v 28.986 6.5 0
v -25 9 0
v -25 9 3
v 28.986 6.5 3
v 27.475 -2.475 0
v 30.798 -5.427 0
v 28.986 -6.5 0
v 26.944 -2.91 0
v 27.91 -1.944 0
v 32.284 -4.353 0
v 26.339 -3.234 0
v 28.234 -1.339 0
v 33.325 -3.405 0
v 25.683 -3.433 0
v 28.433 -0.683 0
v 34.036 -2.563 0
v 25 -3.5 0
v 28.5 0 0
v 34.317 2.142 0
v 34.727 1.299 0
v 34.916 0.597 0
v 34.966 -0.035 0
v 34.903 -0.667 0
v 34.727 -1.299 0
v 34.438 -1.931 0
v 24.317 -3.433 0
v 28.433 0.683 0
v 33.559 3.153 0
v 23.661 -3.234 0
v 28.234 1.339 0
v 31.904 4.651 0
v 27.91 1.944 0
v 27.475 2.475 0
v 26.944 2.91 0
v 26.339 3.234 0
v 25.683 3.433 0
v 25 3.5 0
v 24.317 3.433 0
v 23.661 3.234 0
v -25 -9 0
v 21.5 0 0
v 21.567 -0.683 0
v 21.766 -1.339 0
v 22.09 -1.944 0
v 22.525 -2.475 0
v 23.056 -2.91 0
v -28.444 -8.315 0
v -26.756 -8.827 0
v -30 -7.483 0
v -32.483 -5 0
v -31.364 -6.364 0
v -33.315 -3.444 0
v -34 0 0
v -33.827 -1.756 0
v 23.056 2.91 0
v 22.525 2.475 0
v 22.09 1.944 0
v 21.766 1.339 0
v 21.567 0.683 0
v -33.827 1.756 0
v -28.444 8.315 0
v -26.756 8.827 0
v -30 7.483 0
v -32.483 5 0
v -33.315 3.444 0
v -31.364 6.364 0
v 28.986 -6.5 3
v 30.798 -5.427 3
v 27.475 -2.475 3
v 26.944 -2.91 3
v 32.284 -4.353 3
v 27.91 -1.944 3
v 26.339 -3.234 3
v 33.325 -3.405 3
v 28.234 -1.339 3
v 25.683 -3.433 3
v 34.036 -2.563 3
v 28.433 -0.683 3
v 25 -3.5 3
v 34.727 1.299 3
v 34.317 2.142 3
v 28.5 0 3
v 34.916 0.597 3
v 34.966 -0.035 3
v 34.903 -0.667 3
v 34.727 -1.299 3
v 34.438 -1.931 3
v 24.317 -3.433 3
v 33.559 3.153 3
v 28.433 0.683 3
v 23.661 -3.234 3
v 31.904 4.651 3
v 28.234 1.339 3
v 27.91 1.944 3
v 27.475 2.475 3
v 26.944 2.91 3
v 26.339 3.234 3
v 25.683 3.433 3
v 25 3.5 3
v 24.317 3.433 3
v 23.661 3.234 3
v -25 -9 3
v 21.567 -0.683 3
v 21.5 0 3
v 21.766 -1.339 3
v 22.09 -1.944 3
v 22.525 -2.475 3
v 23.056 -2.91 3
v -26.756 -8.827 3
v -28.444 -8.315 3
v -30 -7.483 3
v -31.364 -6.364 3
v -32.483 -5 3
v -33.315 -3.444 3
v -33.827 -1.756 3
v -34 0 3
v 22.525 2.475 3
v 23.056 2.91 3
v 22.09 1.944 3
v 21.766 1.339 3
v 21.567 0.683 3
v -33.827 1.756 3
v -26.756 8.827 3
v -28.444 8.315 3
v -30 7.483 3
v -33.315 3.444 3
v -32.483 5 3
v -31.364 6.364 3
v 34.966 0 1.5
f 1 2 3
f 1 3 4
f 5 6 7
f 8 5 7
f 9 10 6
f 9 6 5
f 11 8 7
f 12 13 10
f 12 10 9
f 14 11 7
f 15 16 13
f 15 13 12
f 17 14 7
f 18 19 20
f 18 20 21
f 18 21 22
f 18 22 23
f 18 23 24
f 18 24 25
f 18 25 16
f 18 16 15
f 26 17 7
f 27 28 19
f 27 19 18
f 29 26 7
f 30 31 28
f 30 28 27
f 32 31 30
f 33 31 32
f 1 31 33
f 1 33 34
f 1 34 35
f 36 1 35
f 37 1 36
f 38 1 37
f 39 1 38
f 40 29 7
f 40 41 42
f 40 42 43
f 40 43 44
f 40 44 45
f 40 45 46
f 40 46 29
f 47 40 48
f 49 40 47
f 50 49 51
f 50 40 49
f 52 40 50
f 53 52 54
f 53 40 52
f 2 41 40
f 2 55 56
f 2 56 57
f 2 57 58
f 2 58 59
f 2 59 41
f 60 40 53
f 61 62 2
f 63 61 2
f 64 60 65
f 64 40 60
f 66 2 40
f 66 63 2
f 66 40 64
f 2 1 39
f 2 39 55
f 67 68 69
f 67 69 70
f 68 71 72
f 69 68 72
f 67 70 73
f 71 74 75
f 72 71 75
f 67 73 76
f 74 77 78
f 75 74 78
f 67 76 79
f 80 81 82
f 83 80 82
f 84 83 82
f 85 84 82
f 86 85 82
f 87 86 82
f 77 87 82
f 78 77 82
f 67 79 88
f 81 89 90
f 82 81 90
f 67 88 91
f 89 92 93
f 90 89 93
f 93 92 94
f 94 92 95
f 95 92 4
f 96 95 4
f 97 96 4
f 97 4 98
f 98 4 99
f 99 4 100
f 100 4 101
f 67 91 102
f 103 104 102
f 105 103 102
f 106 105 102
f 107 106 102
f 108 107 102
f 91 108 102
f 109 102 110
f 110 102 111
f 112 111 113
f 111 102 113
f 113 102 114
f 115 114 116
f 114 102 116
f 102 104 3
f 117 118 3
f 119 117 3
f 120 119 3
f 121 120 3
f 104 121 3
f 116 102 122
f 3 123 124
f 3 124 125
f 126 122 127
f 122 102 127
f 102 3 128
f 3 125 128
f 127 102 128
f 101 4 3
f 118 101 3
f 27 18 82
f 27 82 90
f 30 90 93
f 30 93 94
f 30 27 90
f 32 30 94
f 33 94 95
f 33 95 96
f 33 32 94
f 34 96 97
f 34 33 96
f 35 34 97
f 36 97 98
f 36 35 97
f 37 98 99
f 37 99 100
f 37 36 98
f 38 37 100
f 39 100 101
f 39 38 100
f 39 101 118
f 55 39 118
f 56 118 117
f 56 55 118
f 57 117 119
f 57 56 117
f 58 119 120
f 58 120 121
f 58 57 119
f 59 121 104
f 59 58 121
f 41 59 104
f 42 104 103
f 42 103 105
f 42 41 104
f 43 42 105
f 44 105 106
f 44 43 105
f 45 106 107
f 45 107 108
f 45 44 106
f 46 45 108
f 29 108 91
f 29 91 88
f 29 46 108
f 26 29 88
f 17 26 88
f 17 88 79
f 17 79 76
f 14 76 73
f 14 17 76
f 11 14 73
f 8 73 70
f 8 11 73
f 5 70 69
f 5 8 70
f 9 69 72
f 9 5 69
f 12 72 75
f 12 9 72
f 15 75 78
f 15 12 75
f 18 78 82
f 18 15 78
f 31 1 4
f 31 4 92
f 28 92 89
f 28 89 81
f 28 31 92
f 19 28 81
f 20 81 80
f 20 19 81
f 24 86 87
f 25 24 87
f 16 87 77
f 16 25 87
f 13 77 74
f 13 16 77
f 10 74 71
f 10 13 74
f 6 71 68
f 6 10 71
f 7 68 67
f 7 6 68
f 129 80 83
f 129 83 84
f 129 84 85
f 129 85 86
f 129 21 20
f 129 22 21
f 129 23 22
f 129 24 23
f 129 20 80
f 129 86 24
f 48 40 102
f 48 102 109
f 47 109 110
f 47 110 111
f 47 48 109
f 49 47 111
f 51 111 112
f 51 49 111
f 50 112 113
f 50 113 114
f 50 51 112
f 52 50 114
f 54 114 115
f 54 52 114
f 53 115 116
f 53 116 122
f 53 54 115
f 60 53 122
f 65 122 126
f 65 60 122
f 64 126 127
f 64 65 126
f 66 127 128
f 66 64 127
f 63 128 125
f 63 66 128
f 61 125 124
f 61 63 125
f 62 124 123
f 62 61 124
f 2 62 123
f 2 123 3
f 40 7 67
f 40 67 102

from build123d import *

# Parameters (mm, degrees)
SKETCH1_R           = 3.5
BOSS_EXTRUDE1_DEPTH = 3


with BuildPart() as part:
    # Sketch1 → Boss-Extrude1 (new body)
    with BuildSketch(Plane.XY):
        with BuildLine():
            Line((-25, 9), (28.985507246, 6.5))
            add(Edge.make_bspline(
                [(28.985507246, 6.5), (40.946682853, 0), (28.985507246, -6.5)],
                knots=[0, 0, 0, 1, 1, 1], degree=2))
            Line((28.985507246, -6.5), (-25, -9))
            ThreePointArc((-25, -9), (-34, 0), (-25, 9))
        make_face()
        with Locations((25, 0)):
            Circle(SKETCH1_R, mode=Mode.SUBTRACT)
    extrude(amount=BOSS_EXTRUDE1_DEPTH)


solid = part.part
